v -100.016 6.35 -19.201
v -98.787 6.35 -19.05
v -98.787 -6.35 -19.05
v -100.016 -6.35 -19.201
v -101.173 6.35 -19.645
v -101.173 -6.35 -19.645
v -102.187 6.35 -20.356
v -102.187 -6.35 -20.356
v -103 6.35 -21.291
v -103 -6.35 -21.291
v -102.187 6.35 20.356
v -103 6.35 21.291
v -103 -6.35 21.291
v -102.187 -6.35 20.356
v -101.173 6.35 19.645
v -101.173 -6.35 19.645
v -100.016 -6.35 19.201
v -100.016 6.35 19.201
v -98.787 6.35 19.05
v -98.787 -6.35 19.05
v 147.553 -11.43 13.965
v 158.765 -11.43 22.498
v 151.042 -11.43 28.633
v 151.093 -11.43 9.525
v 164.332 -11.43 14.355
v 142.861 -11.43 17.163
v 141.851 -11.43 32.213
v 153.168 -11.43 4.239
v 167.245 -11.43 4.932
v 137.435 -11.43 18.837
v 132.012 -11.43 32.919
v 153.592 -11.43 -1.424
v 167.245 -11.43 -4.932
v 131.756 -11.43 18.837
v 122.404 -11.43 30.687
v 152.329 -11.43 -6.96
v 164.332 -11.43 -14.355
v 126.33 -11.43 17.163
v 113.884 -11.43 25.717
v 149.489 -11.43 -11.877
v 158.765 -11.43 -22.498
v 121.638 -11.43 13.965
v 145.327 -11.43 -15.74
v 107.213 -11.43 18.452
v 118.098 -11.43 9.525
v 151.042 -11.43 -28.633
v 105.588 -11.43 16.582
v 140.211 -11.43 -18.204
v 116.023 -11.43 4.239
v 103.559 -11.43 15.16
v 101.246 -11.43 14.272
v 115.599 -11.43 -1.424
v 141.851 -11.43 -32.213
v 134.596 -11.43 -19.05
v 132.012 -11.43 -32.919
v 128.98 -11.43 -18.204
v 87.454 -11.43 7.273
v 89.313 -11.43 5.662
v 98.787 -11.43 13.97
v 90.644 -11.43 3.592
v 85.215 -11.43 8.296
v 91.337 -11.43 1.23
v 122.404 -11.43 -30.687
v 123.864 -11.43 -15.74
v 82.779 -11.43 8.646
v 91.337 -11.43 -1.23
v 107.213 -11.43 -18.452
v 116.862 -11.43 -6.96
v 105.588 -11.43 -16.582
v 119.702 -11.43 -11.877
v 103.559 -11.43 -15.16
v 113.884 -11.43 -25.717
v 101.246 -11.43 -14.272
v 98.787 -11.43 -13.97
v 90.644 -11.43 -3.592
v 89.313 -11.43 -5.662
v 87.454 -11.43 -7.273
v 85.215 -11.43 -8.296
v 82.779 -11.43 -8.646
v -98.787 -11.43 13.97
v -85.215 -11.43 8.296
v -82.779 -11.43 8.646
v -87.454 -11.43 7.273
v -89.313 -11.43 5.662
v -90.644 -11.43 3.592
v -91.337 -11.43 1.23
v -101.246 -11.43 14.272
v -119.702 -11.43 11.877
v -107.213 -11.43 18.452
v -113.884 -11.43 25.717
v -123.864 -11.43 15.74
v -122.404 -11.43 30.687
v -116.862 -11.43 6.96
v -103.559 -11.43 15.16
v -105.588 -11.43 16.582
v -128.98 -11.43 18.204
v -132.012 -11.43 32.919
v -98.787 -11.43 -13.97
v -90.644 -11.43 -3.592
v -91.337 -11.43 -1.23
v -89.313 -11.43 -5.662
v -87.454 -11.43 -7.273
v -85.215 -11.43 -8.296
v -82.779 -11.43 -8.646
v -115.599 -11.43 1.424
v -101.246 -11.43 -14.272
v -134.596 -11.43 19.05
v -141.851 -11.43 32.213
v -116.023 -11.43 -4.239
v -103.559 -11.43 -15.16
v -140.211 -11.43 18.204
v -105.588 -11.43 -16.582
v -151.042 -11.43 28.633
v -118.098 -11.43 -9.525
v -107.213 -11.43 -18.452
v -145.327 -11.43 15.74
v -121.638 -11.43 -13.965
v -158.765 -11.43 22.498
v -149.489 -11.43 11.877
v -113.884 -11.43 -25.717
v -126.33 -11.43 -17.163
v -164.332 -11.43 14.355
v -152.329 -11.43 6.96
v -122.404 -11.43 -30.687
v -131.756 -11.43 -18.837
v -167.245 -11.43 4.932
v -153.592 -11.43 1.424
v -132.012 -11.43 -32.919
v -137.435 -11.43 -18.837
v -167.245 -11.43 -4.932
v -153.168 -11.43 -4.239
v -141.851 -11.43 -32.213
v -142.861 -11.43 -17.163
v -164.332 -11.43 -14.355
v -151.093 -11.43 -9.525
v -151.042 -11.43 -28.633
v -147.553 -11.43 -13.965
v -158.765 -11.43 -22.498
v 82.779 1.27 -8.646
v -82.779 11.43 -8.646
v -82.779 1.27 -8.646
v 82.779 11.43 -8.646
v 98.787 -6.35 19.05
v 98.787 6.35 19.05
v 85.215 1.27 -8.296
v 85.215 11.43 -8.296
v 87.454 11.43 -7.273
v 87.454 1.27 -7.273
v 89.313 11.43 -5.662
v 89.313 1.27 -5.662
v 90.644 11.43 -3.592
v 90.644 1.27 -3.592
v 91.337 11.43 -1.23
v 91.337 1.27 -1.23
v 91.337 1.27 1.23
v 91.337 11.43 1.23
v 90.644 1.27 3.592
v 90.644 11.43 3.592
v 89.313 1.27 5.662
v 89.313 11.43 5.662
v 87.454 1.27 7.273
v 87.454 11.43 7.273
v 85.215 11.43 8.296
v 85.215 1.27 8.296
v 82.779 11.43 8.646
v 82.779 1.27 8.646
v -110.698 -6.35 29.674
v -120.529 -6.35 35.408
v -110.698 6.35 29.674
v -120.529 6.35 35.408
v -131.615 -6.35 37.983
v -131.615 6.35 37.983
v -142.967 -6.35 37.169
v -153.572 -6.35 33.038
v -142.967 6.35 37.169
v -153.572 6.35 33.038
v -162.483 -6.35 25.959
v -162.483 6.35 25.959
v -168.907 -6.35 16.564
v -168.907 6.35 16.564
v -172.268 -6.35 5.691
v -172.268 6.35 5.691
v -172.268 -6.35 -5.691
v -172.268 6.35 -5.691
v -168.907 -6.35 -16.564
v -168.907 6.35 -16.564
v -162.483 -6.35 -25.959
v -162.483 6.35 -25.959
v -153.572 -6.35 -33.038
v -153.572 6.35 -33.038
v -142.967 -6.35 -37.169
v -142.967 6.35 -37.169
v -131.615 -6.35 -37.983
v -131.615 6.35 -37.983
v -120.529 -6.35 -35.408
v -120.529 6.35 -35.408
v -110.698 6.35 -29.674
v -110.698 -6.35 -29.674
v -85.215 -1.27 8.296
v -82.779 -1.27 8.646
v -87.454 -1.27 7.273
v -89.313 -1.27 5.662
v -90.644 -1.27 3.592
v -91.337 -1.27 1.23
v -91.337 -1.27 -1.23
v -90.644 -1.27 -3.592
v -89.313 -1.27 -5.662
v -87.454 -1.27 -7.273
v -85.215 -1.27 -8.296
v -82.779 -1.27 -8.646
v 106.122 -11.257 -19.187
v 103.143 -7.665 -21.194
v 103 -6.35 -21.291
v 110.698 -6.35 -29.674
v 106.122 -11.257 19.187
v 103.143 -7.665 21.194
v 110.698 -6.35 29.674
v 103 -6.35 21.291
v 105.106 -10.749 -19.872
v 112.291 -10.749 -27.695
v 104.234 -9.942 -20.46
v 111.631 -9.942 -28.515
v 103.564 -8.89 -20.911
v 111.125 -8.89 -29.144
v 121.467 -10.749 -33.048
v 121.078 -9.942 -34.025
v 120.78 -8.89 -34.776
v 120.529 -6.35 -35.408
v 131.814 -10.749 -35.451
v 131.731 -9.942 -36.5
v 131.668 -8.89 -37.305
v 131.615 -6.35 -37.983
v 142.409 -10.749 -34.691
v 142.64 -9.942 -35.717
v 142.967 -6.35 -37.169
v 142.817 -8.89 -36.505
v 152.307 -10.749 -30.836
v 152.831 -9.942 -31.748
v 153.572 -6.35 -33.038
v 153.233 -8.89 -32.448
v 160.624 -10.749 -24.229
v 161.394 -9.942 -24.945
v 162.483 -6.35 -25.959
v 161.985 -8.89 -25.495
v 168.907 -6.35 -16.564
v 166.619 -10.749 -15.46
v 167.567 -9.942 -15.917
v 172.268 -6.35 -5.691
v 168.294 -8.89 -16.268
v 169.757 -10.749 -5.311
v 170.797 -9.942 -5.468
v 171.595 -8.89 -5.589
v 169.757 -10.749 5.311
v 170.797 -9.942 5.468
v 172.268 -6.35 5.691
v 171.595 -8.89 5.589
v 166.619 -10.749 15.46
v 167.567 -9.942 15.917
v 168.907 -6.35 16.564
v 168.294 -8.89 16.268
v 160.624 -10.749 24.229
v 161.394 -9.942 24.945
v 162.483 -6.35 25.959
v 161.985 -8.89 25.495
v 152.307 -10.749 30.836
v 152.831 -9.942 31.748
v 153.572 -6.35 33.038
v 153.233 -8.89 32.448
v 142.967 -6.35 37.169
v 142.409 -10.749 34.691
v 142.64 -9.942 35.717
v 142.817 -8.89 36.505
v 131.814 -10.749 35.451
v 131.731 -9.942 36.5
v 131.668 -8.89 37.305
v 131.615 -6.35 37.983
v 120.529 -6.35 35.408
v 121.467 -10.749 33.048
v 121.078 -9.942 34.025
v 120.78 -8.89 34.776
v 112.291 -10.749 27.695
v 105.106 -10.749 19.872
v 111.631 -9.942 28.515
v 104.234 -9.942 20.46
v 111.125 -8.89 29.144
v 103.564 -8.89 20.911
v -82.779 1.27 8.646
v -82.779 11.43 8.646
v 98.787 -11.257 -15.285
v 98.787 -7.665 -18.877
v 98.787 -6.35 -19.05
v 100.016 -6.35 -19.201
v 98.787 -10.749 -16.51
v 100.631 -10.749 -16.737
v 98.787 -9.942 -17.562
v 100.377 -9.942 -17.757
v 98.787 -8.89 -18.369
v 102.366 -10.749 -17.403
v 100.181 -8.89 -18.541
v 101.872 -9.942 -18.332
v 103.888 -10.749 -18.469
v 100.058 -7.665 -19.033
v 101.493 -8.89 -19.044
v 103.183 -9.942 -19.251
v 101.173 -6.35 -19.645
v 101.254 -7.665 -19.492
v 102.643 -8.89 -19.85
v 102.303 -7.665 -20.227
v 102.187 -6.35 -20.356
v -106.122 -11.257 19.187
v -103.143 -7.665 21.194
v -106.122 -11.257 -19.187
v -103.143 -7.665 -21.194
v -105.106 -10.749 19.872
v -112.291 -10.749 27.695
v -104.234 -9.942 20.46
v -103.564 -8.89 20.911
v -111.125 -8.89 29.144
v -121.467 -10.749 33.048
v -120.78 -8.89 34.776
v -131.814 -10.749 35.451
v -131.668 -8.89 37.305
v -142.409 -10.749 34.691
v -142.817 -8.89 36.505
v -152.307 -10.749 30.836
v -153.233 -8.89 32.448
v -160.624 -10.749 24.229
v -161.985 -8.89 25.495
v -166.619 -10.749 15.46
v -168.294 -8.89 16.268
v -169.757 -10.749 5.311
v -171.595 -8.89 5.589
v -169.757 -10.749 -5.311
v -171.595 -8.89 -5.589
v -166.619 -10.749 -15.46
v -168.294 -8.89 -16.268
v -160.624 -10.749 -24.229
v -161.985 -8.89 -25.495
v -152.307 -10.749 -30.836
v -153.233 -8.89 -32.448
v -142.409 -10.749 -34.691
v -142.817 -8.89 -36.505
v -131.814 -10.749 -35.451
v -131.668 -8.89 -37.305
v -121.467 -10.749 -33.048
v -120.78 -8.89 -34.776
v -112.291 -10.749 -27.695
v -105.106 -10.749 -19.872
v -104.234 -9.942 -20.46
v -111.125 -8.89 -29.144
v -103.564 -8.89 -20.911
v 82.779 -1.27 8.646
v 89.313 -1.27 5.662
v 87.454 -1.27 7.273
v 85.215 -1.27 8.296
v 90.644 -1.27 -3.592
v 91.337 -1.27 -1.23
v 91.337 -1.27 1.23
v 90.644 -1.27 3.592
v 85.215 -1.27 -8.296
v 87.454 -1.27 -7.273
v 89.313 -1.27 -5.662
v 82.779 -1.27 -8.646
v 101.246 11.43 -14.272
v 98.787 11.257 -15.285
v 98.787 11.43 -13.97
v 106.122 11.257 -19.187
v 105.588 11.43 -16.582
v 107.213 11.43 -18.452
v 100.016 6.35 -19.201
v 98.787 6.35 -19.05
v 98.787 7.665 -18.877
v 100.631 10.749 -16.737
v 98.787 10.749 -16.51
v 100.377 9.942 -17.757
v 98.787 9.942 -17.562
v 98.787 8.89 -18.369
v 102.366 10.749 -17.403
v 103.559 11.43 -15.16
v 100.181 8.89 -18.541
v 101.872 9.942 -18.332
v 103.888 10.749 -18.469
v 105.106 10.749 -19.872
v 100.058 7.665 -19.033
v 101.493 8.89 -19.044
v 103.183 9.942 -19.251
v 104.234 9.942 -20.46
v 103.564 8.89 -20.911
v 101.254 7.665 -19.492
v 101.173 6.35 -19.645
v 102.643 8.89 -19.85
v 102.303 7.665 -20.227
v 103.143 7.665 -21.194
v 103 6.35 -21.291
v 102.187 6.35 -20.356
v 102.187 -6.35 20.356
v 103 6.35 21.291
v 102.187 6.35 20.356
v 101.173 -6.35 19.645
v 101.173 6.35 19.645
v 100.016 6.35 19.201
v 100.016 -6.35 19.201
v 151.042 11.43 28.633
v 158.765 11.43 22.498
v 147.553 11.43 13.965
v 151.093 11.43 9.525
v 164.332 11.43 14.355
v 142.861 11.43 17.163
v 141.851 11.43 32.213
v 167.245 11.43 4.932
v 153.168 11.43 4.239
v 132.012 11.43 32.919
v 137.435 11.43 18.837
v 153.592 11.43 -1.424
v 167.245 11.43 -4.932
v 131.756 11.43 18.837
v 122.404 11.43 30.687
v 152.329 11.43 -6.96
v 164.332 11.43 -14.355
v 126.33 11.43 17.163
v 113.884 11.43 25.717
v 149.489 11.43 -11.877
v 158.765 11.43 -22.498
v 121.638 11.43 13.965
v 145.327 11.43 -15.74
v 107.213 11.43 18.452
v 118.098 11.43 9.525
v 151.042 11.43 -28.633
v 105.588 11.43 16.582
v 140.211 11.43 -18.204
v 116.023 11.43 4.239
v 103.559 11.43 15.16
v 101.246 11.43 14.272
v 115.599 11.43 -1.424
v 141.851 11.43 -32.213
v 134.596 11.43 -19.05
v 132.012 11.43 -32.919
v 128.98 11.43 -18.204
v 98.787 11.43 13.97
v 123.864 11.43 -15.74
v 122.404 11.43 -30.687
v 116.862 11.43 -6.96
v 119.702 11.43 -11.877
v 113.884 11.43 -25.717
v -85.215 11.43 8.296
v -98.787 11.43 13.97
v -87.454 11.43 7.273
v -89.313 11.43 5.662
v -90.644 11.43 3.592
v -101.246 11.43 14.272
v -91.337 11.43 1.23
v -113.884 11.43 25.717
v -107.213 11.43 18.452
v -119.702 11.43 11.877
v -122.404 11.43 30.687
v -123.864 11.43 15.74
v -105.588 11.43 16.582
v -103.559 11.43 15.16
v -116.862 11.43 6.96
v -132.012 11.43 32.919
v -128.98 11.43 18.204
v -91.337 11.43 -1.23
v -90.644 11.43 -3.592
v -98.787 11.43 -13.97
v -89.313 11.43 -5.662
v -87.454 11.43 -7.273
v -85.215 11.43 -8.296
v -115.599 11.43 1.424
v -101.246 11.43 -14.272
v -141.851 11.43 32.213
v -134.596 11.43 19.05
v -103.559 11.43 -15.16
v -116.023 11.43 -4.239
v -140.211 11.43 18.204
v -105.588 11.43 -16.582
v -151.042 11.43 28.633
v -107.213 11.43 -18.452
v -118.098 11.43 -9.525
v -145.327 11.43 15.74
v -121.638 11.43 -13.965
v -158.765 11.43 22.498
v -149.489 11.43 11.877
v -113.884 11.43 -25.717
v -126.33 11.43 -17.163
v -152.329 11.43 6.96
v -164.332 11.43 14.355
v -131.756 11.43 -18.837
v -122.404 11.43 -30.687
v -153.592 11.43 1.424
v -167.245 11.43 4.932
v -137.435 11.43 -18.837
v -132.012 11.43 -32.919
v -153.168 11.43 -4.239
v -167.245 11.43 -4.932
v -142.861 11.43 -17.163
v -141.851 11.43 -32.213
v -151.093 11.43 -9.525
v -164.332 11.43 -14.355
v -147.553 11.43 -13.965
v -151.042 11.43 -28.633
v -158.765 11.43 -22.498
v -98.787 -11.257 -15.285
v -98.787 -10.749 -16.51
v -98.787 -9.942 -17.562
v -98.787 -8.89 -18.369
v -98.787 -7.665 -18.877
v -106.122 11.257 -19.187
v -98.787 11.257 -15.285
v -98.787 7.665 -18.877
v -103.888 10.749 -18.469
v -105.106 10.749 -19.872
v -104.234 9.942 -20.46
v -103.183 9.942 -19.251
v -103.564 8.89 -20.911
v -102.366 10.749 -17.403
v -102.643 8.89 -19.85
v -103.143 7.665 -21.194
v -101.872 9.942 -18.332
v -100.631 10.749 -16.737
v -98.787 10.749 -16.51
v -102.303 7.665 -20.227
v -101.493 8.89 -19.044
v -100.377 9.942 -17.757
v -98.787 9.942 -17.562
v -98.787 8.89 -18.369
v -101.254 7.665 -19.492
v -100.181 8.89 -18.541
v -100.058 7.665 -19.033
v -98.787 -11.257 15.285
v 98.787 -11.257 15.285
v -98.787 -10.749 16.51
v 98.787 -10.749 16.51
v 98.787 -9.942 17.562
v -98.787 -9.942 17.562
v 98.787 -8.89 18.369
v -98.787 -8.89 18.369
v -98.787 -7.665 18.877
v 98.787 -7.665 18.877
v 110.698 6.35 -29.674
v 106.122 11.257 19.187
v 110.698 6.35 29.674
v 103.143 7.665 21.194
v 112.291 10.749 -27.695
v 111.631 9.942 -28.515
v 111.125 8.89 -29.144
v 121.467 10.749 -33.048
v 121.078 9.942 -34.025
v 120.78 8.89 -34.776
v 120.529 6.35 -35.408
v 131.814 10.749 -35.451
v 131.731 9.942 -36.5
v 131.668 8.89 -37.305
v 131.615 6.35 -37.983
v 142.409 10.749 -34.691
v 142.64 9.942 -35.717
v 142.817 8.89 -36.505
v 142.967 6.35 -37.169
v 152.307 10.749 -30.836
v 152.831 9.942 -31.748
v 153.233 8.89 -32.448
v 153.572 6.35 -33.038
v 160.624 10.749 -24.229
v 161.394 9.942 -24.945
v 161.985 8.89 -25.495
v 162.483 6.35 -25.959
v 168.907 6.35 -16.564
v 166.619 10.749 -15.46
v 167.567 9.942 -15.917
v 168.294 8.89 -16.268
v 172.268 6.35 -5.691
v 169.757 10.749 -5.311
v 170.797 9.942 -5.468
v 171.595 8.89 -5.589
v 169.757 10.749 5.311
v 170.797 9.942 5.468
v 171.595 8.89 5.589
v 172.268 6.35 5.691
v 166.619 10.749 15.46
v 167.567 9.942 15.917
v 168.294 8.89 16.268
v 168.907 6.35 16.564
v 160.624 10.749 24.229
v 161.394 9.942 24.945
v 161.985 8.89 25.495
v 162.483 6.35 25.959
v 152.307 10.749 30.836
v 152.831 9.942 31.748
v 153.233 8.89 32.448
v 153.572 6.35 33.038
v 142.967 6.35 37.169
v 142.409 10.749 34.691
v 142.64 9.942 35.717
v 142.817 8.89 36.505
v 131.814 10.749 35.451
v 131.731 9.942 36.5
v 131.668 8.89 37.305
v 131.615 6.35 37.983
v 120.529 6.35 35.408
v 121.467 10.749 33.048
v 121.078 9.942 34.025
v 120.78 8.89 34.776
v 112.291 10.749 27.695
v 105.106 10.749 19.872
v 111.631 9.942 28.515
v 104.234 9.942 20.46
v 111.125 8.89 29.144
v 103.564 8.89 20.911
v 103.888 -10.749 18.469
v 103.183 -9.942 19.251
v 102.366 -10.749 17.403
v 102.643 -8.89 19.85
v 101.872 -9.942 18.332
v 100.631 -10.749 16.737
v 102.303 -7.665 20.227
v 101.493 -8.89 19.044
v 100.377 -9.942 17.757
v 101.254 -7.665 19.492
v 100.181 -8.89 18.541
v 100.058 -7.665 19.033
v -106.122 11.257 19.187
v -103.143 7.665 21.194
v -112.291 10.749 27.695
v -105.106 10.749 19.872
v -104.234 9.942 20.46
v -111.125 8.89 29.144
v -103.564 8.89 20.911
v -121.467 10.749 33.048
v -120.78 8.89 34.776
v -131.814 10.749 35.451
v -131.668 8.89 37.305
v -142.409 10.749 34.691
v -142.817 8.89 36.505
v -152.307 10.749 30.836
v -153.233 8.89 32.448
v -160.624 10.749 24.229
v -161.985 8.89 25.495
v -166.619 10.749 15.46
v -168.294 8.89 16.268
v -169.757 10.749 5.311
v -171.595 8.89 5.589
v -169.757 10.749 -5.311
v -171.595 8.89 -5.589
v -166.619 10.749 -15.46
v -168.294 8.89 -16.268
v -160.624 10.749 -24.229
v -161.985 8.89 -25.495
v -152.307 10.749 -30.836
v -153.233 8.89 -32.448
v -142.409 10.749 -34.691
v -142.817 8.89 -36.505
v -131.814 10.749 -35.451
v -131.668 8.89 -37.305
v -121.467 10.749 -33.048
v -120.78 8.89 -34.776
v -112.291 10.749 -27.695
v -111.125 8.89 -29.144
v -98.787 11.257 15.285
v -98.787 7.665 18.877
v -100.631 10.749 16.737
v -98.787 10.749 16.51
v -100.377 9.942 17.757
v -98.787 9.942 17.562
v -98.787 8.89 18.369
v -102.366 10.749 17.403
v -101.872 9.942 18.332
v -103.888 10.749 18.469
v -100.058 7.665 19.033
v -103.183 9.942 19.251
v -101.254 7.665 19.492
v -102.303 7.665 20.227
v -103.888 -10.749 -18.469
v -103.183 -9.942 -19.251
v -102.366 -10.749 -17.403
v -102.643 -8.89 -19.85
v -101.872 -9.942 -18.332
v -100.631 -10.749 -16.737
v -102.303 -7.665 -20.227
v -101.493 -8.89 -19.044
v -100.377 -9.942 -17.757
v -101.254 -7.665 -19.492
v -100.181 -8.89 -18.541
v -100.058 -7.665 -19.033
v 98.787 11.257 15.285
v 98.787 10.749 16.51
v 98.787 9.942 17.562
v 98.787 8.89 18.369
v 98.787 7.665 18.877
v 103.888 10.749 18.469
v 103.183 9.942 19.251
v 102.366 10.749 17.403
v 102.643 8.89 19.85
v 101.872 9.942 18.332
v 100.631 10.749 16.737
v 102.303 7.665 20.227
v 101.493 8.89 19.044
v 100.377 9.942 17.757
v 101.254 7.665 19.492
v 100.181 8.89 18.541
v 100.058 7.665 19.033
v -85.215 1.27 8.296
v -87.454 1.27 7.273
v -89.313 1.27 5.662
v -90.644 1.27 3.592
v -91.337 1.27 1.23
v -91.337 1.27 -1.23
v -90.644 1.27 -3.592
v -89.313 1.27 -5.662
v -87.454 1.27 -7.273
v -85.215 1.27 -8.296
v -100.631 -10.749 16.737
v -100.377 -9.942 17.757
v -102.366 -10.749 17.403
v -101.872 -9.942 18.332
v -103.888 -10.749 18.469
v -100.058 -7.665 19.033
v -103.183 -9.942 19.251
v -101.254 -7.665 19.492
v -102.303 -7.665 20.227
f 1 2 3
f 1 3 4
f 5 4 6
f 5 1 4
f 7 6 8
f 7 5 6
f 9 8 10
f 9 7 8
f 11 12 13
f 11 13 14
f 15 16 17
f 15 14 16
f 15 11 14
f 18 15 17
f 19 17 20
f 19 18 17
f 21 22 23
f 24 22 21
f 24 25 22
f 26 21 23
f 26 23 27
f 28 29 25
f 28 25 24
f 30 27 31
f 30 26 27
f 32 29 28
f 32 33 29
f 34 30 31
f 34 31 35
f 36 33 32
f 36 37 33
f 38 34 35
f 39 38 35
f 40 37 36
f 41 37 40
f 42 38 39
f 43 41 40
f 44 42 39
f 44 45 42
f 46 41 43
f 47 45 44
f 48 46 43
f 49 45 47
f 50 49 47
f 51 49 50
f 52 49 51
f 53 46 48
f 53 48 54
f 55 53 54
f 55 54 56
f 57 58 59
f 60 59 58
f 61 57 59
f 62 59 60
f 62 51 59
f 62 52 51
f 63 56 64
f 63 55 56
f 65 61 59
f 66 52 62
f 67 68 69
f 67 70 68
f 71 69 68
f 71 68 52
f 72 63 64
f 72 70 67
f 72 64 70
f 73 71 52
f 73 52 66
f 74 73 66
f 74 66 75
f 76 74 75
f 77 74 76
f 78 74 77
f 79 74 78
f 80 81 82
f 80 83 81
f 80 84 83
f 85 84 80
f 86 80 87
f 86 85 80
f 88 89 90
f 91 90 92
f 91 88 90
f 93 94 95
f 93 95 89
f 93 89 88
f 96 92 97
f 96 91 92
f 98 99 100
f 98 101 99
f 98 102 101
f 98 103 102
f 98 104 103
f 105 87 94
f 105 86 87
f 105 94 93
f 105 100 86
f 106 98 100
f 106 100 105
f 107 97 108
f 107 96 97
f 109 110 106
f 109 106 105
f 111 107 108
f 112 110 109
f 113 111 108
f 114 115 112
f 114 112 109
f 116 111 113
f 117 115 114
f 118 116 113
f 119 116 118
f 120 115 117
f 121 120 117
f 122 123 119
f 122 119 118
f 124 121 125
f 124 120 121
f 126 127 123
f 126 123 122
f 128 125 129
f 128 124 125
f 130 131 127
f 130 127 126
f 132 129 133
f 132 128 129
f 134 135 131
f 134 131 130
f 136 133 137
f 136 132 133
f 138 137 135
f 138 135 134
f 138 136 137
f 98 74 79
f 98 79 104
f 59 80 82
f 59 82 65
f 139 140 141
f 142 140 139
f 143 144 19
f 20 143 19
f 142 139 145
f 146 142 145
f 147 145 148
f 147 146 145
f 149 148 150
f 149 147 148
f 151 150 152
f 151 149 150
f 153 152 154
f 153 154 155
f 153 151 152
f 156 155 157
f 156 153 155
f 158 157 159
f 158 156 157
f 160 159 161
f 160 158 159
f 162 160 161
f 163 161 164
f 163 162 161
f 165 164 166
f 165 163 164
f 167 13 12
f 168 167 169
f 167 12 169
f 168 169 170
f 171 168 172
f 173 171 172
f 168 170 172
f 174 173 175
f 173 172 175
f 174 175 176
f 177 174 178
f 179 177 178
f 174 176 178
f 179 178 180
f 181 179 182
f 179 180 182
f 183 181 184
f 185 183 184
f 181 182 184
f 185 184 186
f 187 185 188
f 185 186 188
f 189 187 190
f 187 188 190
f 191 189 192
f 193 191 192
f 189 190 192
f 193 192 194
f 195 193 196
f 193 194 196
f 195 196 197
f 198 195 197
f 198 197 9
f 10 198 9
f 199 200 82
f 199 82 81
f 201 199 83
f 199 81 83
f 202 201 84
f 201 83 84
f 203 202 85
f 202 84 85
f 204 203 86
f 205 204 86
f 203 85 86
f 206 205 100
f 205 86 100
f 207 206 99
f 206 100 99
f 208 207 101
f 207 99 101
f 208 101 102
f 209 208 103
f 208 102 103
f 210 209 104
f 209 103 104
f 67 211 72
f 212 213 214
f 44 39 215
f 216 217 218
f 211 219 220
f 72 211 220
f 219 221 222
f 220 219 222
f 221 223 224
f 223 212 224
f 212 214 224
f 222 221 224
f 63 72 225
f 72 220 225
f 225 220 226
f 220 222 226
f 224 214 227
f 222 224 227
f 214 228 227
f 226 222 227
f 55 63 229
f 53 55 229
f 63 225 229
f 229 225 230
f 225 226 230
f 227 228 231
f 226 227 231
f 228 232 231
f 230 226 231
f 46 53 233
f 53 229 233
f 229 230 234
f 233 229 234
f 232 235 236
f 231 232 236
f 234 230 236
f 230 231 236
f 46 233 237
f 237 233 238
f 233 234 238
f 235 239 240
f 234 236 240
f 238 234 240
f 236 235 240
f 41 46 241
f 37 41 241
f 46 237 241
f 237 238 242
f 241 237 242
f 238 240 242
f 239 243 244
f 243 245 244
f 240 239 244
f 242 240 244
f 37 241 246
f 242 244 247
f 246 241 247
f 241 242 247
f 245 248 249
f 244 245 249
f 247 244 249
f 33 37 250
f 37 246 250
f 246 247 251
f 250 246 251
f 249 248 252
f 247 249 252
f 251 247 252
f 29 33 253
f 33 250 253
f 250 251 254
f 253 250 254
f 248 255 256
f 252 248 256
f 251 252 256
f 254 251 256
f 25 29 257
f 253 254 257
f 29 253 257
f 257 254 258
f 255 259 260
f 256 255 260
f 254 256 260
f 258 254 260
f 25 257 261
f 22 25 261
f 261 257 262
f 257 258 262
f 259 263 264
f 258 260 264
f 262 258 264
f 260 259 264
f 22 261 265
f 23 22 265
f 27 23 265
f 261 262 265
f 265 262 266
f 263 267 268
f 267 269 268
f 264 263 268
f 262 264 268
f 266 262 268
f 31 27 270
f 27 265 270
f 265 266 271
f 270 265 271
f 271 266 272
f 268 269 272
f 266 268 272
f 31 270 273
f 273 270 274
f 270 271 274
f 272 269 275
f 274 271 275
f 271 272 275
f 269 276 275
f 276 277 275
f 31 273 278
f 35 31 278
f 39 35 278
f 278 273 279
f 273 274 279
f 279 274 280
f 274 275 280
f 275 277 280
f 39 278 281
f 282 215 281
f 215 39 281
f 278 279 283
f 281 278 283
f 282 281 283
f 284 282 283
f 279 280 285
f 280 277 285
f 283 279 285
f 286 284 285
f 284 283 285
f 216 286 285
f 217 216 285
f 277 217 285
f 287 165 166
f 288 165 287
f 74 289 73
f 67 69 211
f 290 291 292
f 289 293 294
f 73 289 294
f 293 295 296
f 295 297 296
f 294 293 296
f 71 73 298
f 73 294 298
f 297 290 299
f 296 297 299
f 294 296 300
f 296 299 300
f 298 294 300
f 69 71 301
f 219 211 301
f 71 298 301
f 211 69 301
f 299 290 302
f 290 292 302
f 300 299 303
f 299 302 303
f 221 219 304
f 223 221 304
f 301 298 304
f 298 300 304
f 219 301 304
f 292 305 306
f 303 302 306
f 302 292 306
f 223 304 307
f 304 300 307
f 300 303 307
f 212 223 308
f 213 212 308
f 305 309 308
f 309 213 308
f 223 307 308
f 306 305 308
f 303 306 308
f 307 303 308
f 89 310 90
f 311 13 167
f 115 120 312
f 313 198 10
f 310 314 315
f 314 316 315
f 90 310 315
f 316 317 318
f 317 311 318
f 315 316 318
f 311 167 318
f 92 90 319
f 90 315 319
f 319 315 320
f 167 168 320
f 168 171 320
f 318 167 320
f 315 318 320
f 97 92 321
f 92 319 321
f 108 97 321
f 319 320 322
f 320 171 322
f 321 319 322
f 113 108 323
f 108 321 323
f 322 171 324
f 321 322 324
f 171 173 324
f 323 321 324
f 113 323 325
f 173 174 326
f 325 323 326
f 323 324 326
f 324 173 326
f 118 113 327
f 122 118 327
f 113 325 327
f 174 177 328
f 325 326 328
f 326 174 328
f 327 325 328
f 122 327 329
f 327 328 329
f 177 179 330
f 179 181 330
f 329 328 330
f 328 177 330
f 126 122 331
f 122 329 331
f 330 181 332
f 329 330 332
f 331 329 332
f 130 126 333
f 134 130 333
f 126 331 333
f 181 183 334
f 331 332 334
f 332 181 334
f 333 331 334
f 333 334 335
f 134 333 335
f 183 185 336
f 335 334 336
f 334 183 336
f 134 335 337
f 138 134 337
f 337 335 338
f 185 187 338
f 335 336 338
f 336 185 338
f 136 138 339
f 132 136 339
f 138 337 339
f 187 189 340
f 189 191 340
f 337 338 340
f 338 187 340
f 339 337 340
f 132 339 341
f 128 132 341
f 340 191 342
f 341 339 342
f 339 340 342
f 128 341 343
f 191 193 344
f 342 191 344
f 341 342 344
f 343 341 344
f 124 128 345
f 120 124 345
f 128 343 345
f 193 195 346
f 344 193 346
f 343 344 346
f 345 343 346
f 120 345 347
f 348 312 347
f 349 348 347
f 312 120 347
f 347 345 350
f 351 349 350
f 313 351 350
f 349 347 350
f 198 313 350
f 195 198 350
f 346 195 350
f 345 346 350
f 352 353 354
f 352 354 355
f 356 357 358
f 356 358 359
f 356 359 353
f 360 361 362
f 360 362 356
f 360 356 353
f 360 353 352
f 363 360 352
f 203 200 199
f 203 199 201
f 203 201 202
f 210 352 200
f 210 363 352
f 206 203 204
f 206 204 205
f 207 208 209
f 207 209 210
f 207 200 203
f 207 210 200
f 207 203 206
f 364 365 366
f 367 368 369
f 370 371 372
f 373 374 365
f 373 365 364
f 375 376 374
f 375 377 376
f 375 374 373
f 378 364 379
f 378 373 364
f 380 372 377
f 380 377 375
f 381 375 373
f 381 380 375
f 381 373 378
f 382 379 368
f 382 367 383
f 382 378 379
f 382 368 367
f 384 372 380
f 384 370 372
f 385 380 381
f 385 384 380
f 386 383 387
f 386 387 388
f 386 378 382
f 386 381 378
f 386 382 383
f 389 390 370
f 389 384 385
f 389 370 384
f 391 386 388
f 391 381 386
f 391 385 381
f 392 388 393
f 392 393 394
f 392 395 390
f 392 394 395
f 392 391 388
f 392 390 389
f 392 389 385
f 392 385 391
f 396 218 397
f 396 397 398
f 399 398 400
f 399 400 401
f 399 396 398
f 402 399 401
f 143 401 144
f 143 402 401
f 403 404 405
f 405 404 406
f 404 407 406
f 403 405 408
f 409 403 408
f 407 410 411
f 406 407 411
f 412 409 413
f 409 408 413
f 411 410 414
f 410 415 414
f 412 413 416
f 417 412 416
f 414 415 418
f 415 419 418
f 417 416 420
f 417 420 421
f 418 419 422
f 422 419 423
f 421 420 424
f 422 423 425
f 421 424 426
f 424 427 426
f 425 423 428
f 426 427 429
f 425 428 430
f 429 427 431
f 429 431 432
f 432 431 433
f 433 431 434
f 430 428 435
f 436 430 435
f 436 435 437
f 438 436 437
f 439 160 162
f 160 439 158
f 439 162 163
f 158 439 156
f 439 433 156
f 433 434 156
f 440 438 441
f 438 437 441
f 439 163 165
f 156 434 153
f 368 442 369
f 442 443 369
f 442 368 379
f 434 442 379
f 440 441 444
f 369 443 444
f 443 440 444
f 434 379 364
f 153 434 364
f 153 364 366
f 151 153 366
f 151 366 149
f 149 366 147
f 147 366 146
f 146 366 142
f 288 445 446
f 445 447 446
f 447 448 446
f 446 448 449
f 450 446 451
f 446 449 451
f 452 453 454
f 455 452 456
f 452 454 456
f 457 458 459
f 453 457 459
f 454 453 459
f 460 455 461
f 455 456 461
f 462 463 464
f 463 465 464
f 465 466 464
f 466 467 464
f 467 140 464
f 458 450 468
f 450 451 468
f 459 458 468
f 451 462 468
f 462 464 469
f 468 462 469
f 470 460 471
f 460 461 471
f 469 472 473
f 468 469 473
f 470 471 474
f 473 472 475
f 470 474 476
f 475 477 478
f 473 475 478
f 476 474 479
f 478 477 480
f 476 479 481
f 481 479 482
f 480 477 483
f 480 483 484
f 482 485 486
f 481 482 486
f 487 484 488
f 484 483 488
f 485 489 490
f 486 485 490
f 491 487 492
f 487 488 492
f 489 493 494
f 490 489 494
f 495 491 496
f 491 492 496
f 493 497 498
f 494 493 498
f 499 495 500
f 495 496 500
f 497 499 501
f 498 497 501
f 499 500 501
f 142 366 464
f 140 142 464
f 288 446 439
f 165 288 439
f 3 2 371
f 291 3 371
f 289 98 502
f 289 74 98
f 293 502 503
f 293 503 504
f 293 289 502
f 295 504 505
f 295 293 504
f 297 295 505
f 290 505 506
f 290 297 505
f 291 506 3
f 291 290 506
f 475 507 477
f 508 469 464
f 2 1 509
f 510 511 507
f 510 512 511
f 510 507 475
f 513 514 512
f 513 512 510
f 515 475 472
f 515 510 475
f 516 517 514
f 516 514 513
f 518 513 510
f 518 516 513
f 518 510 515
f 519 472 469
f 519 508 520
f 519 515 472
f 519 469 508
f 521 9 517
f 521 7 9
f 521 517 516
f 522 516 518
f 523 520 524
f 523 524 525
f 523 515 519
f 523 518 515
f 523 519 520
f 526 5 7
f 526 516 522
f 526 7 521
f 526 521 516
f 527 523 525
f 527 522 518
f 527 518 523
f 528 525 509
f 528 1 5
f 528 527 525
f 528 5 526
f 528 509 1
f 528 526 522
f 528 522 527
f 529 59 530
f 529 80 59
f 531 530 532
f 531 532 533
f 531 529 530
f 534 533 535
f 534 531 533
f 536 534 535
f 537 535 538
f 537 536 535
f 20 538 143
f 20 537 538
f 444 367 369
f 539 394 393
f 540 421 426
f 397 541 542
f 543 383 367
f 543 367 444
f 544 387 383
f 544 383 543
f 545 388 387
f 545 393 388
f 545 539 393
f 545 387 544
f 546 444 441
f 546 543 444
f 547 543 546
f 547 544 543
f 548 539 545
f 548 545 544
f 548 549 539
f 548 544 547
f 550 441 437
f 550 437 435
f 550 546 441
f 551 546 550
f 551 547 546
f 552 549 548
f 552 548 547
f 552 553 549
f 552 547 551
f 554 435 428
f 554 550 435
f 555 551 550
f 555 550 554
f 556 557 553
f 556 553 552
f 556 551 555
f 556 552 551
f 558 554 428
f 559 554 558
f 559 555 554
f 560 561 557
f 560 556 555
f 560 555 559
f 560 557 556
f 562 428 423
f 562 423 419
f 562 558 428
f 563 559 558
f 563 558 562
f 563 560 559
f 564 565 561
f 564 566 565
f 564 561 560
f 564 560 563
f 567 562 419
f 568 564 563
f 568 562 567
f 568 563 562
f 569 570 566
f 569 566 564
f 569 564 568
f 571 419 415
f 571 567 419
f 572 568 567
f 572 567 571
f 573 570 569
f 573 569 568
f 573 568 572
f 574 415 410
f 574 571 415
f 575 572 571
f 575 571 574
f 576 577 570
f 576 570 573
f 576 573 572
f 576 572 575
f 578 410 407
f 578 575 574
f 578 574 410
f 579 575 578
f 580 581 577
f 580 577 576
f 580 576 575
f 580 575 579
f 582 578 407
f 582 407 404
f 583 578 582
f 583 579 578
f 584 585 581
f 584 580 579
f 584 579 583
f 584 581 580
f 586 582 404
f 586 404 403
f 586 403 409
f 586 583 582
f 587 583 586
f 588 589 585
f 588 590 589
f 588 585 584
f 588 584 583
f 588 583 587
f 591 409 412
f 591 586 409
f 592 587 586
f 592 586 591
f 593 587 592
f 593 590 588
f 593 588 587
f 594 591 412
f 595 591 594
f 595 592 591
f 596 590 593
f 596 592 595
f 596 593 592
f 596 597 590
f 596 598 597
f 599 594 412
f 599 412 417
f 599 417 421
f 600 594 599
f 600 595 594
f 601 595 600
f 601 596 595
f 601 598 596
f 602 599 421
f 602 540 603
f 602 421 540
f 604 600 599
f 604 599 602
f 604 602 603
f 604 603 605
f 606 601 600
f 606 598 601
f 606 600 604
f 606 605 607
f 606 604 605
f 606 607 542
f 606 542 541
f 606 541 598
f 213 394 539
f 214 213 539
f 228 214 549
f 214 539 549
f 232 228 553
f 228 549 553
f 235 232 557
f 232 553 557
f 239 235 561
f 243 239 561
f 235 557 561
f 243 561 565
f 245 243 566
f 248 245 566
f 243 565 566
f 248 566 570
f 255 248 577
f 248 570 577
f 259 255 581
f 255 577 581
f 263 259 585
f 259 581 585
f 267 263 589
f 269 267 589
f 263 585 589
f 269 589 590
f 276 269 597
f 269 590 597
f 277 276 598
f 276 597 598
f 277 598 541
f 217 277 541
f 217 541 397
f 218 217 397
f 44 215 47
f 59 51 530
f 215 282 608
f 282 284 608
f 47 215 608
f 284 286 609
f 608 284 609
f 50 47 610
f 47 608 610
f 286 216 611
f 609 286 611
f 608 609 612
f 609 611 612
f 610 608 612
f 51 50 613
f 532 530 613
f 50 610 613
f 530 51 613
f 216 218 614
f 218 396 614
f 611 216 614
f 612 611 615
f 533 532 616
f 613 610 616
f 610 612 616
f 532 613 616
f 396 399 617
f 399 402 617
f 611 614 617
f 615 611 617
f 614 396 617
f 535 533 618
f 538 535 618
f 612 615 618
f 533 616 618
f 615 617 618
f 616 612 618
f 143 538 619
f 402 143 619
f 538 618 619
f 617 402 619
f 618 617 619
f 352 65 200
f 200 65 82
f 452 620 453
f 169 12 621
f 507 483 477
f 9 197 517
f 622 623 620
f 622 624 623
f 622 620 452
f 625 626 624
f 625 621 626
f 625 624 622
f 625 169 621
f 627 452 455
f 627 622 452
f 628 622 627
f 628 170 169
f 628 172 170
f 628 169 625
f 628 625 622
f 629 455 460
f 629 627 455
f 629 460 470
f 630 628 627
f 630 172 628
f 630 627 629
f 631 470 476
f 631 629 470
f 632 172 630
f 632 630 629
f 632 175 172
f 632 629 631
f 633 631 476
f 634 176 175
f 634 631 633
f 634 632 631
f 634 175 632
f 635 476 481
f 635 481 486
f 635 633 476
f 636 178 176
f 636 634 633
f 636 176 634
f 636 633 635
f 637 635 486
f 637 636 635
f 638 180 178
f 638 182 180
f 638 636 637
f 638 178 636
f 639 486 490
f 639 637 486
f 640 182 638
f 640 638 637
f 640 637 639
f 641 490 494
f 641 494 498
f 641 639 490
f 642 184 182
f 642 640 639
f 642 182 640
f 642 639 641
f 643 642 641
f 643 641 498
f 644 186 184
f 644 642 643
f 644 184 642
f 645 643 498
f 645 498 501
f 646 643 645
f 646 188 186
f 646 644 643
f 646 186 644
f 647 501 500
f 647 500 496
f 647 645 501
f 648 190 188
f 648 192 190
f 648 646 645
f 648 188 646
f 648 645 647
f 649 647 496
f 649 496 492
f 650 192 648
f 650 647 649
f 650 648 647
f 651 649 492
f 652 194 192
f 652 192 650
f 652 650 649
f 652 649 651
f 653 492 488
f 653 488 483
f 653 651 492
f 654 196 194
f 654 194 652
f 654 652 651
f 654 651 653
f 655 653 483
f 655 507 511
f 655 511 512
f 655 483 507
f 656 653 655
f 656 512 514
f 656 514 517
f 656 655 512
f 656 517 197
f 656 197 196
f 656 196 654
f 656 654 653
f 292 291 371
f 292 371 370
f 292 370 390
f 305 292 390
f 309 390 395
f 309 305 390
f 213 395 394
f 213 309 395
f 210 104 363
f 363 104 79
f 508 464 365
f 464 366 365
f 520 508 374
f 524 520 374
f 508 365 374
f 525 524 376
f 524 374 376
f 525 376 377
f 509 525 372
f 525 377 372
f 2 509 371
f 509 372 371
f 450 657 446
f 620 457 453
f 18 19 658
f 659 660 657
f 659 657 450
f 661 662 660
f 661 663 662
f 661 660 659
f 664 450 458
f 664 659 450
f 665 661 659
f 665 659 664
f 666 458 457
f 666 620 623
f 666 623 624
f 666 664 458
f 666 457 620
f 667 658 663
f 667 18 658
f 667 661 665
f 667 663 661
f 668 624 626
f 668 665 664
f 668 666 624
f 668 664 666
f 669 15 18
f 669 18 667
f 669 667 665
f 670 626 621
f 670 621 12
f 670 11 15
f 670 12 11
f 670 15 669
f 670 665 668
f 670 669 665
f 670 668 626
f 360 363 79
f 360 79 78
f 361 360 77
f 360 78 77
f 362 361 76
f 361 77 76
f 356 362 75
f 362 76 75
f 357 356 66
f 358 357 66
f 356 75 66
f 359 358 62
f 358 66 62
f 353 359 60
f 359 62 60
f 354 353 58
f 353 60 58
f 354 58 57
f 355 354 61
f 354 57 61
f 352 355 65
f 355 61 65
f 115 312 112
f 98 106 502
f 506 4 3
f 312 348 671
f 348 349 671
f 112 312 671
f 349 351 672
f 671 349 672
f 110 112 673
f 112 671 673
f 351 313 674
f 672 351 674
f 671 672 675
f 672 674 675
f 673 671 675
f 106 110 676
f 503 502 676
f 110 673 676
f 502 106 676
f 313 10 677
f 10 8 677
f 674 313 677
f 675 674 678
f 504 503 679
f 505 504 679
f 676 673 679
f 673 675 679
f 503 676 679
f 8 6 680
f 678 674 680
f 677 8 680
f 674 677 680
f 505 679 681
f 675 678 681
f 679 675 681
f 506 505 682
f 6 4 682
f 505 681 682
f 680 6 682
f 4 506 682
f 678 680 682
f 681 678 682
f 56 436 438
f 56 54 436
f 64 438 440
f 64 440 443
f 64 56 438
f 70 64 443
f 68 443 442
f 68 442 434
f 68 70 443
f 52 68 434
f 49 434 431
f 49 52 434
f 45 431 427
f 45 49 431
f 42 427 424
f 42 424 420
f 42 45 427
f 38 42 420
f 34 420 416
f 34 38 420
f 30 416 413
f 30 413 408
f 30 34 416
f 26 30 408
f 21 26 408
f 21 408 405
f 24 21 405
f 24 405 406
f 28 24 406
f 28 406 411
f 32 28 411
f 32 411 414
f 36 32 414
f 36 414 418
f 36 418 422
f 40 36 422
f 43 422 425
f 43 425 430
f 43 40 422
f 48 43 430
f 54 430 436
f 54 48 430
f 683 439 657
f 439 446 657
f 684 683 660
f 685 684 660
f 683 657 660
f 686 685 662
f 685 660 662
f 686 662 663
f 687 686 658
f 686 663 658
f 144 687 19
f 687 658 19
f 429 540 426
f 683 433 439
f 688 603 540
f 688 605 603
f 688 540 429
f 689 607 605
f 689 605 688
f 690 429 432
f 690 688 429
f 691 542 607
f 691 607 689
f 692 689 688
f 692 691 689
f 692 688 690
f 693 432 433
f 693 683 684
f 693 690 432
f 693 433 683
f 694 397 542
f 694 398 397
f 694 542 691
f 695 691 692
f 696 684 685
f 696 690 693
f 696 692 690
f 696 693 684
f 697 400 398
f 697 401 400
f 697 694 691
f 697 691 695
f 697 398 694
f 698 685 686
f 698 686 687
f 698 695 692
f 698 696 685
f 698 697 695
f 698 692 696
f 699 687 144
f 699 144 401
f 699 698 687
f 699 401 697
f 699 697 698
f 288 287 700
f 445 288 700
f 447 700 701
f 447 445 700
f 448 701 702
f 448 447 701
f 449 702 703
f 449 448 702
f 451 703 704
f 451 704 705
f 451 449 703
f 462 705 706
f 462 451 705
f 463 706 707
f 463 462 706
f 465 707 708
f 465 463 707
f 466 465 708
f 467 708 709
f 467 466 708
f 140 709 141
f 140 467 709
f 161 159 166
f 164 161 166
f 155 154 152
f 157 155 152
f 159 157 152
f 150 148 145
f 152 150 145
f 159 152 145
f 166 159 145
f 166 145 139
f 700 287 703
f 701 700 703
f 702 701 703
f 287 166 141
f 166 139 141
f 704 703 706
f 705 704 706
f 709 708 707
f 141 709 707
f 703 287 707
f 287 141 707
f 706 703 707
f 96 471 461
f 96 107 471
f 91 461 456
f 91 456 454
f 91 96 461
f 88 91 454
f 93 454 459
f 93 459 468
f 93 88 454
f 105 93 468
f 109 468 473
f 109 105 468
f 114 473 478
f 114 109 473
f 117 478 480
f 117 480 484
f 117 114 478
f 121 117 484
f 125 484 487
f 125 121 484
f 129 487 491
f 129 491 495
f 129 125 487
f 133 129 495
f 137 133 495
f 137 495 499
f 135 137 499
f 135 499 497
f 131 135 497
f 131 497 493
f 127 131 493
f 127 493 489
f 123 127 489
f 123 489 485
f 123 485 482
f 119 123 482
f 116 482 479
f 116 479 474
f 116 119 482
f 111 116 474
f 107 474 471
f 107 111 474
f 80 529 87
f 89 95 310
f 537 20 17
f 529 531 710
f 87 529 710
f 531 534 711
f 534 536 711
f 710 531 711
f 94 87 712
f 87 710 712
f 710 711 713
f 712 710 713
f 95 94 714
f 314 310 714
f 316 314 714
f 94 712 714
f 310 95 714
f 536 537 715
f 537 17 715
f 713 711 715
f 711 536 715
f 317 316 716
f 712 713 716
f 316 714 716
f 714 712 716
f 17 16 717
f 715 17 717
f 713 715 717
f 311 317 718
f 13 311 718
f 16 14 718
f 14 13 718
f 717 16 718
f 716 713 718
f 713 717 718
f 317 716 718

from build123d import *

# Parameters (mm, degrees)
SKETCH1_R           = 19.05
BOSS_EXTRUDE1_DEPTH = 11.43
CUT_EXTRUDE1_DEPTH  = 10.16
FILLET1_R           = 5.08
FILLET2_R           = 5.08


with BuildPart() as part:
    # Sketch1 → Boss-Extrude1 (new, symmetric)
    with BuildSketch(Plane(origin=(0, 0, 0), x_dir=(1, 0, 0), z_dir=(0, 1, 0))):
        with BuildLine():
            Line((-101.6, 19.05), (101.6, 19.05))
            ThreePointArc((101.6, 19.05), (172.695567884, 0), (101.6, -19.05))
            Line((101.6, -19.05), (-101.6, -19.05))
            ThreePointArc((-101.6, -19.05), (-172.695567884, 0), (-101.6, 19.05))
        make_face()
        with Locations(Location((-134.595567884, 0, 0), (0, 0, 270))):
            Circle(SKETCH1_R, mode=Mode.SUBTRACT)
        with Locations(Location((134.595567884, 0, 0), (0, 0, 90))):
            Circle(SKETCH1_R, mode=Mode.SUBTRACT)
    extrude(amount=BOSS_EXTRUDE1_DEPTH, both=True)

    # Sketch2 → Cut-Extrude1 (cut)
    with BuildSketch(Plane(origin=(0, 11.43, 0), x_dir=(1, 0, 0), z_dir=(0, 1, 0))):
        with BuildLine():
            Line((-82.77922336, 8.645829995), (82.77922336, 8.645829995))
            ThreePointArc((82.77922336, 8.645829995), (91.425053355, 0), (82.77922336, -8.645829995))
            Line((82.77922336, -8.645829995), (-82.77922336, -8.645829995))
            ThreePointArc((-82.77922336, -8.645829995), (-91.425053355, 0), (-82.77922336, 8.645829995))
        make_face()
    cut_extrude1 = extrude(amount=-CUT_EXTRUDE1_DEPTH, mode=Mode.SUBTRACT)

    # Mirror2: Cut-Extrude1 across plane
    add(cut_extrude1.mirror(Plane.ZX), mode=Mode.SUBTRACT)

    # Fillet1
    fillet1_edges = [part.edges().sort_by_distance(p)[0] for p in [
        (101.6, 0, 19.05),
        (-101.6, 0, 19.05),
        (-101.6, 0, -19.05),
        (101.6, 0, -19.05),
    ]]
    fillet(fillet1_edges, radius=FILLET1_R)

    # Fillet2
    fillet2_edges = [part.edges().sort_by_distance(p)[0] for p in [
        (-172.695567884, -11.43, 0),
        (-172.695567884, 11.43, 0),
        (0, -11.43, -19.05),
        (0, 11.43, -19.05),
        (0, -11.43, 19.05),
        (0, 11.43, 19.05),
        (172.695567884, -11.43, 0),
        (172.695567884, 11.43, 0),
        (-101.172887096, -11.43, -19.645157554),
        (-101.172887096, 11.43, -19.645157554),
        (-101.172887096, -11.43, 19.645157554),
        (-101.172887096, 11.43, 19.645157554),
        (101.172887096, -11.43, 19.645157554),
        (101.172887096, 11.43, 19.645157554),
        (101.172887096, -11.43, -19.645157554),
        (101.172887096, 11.43, -19.645157554),
    ]]
    fillet(fillet2_edges, radius=FILLET2_R)


solid = part.part
